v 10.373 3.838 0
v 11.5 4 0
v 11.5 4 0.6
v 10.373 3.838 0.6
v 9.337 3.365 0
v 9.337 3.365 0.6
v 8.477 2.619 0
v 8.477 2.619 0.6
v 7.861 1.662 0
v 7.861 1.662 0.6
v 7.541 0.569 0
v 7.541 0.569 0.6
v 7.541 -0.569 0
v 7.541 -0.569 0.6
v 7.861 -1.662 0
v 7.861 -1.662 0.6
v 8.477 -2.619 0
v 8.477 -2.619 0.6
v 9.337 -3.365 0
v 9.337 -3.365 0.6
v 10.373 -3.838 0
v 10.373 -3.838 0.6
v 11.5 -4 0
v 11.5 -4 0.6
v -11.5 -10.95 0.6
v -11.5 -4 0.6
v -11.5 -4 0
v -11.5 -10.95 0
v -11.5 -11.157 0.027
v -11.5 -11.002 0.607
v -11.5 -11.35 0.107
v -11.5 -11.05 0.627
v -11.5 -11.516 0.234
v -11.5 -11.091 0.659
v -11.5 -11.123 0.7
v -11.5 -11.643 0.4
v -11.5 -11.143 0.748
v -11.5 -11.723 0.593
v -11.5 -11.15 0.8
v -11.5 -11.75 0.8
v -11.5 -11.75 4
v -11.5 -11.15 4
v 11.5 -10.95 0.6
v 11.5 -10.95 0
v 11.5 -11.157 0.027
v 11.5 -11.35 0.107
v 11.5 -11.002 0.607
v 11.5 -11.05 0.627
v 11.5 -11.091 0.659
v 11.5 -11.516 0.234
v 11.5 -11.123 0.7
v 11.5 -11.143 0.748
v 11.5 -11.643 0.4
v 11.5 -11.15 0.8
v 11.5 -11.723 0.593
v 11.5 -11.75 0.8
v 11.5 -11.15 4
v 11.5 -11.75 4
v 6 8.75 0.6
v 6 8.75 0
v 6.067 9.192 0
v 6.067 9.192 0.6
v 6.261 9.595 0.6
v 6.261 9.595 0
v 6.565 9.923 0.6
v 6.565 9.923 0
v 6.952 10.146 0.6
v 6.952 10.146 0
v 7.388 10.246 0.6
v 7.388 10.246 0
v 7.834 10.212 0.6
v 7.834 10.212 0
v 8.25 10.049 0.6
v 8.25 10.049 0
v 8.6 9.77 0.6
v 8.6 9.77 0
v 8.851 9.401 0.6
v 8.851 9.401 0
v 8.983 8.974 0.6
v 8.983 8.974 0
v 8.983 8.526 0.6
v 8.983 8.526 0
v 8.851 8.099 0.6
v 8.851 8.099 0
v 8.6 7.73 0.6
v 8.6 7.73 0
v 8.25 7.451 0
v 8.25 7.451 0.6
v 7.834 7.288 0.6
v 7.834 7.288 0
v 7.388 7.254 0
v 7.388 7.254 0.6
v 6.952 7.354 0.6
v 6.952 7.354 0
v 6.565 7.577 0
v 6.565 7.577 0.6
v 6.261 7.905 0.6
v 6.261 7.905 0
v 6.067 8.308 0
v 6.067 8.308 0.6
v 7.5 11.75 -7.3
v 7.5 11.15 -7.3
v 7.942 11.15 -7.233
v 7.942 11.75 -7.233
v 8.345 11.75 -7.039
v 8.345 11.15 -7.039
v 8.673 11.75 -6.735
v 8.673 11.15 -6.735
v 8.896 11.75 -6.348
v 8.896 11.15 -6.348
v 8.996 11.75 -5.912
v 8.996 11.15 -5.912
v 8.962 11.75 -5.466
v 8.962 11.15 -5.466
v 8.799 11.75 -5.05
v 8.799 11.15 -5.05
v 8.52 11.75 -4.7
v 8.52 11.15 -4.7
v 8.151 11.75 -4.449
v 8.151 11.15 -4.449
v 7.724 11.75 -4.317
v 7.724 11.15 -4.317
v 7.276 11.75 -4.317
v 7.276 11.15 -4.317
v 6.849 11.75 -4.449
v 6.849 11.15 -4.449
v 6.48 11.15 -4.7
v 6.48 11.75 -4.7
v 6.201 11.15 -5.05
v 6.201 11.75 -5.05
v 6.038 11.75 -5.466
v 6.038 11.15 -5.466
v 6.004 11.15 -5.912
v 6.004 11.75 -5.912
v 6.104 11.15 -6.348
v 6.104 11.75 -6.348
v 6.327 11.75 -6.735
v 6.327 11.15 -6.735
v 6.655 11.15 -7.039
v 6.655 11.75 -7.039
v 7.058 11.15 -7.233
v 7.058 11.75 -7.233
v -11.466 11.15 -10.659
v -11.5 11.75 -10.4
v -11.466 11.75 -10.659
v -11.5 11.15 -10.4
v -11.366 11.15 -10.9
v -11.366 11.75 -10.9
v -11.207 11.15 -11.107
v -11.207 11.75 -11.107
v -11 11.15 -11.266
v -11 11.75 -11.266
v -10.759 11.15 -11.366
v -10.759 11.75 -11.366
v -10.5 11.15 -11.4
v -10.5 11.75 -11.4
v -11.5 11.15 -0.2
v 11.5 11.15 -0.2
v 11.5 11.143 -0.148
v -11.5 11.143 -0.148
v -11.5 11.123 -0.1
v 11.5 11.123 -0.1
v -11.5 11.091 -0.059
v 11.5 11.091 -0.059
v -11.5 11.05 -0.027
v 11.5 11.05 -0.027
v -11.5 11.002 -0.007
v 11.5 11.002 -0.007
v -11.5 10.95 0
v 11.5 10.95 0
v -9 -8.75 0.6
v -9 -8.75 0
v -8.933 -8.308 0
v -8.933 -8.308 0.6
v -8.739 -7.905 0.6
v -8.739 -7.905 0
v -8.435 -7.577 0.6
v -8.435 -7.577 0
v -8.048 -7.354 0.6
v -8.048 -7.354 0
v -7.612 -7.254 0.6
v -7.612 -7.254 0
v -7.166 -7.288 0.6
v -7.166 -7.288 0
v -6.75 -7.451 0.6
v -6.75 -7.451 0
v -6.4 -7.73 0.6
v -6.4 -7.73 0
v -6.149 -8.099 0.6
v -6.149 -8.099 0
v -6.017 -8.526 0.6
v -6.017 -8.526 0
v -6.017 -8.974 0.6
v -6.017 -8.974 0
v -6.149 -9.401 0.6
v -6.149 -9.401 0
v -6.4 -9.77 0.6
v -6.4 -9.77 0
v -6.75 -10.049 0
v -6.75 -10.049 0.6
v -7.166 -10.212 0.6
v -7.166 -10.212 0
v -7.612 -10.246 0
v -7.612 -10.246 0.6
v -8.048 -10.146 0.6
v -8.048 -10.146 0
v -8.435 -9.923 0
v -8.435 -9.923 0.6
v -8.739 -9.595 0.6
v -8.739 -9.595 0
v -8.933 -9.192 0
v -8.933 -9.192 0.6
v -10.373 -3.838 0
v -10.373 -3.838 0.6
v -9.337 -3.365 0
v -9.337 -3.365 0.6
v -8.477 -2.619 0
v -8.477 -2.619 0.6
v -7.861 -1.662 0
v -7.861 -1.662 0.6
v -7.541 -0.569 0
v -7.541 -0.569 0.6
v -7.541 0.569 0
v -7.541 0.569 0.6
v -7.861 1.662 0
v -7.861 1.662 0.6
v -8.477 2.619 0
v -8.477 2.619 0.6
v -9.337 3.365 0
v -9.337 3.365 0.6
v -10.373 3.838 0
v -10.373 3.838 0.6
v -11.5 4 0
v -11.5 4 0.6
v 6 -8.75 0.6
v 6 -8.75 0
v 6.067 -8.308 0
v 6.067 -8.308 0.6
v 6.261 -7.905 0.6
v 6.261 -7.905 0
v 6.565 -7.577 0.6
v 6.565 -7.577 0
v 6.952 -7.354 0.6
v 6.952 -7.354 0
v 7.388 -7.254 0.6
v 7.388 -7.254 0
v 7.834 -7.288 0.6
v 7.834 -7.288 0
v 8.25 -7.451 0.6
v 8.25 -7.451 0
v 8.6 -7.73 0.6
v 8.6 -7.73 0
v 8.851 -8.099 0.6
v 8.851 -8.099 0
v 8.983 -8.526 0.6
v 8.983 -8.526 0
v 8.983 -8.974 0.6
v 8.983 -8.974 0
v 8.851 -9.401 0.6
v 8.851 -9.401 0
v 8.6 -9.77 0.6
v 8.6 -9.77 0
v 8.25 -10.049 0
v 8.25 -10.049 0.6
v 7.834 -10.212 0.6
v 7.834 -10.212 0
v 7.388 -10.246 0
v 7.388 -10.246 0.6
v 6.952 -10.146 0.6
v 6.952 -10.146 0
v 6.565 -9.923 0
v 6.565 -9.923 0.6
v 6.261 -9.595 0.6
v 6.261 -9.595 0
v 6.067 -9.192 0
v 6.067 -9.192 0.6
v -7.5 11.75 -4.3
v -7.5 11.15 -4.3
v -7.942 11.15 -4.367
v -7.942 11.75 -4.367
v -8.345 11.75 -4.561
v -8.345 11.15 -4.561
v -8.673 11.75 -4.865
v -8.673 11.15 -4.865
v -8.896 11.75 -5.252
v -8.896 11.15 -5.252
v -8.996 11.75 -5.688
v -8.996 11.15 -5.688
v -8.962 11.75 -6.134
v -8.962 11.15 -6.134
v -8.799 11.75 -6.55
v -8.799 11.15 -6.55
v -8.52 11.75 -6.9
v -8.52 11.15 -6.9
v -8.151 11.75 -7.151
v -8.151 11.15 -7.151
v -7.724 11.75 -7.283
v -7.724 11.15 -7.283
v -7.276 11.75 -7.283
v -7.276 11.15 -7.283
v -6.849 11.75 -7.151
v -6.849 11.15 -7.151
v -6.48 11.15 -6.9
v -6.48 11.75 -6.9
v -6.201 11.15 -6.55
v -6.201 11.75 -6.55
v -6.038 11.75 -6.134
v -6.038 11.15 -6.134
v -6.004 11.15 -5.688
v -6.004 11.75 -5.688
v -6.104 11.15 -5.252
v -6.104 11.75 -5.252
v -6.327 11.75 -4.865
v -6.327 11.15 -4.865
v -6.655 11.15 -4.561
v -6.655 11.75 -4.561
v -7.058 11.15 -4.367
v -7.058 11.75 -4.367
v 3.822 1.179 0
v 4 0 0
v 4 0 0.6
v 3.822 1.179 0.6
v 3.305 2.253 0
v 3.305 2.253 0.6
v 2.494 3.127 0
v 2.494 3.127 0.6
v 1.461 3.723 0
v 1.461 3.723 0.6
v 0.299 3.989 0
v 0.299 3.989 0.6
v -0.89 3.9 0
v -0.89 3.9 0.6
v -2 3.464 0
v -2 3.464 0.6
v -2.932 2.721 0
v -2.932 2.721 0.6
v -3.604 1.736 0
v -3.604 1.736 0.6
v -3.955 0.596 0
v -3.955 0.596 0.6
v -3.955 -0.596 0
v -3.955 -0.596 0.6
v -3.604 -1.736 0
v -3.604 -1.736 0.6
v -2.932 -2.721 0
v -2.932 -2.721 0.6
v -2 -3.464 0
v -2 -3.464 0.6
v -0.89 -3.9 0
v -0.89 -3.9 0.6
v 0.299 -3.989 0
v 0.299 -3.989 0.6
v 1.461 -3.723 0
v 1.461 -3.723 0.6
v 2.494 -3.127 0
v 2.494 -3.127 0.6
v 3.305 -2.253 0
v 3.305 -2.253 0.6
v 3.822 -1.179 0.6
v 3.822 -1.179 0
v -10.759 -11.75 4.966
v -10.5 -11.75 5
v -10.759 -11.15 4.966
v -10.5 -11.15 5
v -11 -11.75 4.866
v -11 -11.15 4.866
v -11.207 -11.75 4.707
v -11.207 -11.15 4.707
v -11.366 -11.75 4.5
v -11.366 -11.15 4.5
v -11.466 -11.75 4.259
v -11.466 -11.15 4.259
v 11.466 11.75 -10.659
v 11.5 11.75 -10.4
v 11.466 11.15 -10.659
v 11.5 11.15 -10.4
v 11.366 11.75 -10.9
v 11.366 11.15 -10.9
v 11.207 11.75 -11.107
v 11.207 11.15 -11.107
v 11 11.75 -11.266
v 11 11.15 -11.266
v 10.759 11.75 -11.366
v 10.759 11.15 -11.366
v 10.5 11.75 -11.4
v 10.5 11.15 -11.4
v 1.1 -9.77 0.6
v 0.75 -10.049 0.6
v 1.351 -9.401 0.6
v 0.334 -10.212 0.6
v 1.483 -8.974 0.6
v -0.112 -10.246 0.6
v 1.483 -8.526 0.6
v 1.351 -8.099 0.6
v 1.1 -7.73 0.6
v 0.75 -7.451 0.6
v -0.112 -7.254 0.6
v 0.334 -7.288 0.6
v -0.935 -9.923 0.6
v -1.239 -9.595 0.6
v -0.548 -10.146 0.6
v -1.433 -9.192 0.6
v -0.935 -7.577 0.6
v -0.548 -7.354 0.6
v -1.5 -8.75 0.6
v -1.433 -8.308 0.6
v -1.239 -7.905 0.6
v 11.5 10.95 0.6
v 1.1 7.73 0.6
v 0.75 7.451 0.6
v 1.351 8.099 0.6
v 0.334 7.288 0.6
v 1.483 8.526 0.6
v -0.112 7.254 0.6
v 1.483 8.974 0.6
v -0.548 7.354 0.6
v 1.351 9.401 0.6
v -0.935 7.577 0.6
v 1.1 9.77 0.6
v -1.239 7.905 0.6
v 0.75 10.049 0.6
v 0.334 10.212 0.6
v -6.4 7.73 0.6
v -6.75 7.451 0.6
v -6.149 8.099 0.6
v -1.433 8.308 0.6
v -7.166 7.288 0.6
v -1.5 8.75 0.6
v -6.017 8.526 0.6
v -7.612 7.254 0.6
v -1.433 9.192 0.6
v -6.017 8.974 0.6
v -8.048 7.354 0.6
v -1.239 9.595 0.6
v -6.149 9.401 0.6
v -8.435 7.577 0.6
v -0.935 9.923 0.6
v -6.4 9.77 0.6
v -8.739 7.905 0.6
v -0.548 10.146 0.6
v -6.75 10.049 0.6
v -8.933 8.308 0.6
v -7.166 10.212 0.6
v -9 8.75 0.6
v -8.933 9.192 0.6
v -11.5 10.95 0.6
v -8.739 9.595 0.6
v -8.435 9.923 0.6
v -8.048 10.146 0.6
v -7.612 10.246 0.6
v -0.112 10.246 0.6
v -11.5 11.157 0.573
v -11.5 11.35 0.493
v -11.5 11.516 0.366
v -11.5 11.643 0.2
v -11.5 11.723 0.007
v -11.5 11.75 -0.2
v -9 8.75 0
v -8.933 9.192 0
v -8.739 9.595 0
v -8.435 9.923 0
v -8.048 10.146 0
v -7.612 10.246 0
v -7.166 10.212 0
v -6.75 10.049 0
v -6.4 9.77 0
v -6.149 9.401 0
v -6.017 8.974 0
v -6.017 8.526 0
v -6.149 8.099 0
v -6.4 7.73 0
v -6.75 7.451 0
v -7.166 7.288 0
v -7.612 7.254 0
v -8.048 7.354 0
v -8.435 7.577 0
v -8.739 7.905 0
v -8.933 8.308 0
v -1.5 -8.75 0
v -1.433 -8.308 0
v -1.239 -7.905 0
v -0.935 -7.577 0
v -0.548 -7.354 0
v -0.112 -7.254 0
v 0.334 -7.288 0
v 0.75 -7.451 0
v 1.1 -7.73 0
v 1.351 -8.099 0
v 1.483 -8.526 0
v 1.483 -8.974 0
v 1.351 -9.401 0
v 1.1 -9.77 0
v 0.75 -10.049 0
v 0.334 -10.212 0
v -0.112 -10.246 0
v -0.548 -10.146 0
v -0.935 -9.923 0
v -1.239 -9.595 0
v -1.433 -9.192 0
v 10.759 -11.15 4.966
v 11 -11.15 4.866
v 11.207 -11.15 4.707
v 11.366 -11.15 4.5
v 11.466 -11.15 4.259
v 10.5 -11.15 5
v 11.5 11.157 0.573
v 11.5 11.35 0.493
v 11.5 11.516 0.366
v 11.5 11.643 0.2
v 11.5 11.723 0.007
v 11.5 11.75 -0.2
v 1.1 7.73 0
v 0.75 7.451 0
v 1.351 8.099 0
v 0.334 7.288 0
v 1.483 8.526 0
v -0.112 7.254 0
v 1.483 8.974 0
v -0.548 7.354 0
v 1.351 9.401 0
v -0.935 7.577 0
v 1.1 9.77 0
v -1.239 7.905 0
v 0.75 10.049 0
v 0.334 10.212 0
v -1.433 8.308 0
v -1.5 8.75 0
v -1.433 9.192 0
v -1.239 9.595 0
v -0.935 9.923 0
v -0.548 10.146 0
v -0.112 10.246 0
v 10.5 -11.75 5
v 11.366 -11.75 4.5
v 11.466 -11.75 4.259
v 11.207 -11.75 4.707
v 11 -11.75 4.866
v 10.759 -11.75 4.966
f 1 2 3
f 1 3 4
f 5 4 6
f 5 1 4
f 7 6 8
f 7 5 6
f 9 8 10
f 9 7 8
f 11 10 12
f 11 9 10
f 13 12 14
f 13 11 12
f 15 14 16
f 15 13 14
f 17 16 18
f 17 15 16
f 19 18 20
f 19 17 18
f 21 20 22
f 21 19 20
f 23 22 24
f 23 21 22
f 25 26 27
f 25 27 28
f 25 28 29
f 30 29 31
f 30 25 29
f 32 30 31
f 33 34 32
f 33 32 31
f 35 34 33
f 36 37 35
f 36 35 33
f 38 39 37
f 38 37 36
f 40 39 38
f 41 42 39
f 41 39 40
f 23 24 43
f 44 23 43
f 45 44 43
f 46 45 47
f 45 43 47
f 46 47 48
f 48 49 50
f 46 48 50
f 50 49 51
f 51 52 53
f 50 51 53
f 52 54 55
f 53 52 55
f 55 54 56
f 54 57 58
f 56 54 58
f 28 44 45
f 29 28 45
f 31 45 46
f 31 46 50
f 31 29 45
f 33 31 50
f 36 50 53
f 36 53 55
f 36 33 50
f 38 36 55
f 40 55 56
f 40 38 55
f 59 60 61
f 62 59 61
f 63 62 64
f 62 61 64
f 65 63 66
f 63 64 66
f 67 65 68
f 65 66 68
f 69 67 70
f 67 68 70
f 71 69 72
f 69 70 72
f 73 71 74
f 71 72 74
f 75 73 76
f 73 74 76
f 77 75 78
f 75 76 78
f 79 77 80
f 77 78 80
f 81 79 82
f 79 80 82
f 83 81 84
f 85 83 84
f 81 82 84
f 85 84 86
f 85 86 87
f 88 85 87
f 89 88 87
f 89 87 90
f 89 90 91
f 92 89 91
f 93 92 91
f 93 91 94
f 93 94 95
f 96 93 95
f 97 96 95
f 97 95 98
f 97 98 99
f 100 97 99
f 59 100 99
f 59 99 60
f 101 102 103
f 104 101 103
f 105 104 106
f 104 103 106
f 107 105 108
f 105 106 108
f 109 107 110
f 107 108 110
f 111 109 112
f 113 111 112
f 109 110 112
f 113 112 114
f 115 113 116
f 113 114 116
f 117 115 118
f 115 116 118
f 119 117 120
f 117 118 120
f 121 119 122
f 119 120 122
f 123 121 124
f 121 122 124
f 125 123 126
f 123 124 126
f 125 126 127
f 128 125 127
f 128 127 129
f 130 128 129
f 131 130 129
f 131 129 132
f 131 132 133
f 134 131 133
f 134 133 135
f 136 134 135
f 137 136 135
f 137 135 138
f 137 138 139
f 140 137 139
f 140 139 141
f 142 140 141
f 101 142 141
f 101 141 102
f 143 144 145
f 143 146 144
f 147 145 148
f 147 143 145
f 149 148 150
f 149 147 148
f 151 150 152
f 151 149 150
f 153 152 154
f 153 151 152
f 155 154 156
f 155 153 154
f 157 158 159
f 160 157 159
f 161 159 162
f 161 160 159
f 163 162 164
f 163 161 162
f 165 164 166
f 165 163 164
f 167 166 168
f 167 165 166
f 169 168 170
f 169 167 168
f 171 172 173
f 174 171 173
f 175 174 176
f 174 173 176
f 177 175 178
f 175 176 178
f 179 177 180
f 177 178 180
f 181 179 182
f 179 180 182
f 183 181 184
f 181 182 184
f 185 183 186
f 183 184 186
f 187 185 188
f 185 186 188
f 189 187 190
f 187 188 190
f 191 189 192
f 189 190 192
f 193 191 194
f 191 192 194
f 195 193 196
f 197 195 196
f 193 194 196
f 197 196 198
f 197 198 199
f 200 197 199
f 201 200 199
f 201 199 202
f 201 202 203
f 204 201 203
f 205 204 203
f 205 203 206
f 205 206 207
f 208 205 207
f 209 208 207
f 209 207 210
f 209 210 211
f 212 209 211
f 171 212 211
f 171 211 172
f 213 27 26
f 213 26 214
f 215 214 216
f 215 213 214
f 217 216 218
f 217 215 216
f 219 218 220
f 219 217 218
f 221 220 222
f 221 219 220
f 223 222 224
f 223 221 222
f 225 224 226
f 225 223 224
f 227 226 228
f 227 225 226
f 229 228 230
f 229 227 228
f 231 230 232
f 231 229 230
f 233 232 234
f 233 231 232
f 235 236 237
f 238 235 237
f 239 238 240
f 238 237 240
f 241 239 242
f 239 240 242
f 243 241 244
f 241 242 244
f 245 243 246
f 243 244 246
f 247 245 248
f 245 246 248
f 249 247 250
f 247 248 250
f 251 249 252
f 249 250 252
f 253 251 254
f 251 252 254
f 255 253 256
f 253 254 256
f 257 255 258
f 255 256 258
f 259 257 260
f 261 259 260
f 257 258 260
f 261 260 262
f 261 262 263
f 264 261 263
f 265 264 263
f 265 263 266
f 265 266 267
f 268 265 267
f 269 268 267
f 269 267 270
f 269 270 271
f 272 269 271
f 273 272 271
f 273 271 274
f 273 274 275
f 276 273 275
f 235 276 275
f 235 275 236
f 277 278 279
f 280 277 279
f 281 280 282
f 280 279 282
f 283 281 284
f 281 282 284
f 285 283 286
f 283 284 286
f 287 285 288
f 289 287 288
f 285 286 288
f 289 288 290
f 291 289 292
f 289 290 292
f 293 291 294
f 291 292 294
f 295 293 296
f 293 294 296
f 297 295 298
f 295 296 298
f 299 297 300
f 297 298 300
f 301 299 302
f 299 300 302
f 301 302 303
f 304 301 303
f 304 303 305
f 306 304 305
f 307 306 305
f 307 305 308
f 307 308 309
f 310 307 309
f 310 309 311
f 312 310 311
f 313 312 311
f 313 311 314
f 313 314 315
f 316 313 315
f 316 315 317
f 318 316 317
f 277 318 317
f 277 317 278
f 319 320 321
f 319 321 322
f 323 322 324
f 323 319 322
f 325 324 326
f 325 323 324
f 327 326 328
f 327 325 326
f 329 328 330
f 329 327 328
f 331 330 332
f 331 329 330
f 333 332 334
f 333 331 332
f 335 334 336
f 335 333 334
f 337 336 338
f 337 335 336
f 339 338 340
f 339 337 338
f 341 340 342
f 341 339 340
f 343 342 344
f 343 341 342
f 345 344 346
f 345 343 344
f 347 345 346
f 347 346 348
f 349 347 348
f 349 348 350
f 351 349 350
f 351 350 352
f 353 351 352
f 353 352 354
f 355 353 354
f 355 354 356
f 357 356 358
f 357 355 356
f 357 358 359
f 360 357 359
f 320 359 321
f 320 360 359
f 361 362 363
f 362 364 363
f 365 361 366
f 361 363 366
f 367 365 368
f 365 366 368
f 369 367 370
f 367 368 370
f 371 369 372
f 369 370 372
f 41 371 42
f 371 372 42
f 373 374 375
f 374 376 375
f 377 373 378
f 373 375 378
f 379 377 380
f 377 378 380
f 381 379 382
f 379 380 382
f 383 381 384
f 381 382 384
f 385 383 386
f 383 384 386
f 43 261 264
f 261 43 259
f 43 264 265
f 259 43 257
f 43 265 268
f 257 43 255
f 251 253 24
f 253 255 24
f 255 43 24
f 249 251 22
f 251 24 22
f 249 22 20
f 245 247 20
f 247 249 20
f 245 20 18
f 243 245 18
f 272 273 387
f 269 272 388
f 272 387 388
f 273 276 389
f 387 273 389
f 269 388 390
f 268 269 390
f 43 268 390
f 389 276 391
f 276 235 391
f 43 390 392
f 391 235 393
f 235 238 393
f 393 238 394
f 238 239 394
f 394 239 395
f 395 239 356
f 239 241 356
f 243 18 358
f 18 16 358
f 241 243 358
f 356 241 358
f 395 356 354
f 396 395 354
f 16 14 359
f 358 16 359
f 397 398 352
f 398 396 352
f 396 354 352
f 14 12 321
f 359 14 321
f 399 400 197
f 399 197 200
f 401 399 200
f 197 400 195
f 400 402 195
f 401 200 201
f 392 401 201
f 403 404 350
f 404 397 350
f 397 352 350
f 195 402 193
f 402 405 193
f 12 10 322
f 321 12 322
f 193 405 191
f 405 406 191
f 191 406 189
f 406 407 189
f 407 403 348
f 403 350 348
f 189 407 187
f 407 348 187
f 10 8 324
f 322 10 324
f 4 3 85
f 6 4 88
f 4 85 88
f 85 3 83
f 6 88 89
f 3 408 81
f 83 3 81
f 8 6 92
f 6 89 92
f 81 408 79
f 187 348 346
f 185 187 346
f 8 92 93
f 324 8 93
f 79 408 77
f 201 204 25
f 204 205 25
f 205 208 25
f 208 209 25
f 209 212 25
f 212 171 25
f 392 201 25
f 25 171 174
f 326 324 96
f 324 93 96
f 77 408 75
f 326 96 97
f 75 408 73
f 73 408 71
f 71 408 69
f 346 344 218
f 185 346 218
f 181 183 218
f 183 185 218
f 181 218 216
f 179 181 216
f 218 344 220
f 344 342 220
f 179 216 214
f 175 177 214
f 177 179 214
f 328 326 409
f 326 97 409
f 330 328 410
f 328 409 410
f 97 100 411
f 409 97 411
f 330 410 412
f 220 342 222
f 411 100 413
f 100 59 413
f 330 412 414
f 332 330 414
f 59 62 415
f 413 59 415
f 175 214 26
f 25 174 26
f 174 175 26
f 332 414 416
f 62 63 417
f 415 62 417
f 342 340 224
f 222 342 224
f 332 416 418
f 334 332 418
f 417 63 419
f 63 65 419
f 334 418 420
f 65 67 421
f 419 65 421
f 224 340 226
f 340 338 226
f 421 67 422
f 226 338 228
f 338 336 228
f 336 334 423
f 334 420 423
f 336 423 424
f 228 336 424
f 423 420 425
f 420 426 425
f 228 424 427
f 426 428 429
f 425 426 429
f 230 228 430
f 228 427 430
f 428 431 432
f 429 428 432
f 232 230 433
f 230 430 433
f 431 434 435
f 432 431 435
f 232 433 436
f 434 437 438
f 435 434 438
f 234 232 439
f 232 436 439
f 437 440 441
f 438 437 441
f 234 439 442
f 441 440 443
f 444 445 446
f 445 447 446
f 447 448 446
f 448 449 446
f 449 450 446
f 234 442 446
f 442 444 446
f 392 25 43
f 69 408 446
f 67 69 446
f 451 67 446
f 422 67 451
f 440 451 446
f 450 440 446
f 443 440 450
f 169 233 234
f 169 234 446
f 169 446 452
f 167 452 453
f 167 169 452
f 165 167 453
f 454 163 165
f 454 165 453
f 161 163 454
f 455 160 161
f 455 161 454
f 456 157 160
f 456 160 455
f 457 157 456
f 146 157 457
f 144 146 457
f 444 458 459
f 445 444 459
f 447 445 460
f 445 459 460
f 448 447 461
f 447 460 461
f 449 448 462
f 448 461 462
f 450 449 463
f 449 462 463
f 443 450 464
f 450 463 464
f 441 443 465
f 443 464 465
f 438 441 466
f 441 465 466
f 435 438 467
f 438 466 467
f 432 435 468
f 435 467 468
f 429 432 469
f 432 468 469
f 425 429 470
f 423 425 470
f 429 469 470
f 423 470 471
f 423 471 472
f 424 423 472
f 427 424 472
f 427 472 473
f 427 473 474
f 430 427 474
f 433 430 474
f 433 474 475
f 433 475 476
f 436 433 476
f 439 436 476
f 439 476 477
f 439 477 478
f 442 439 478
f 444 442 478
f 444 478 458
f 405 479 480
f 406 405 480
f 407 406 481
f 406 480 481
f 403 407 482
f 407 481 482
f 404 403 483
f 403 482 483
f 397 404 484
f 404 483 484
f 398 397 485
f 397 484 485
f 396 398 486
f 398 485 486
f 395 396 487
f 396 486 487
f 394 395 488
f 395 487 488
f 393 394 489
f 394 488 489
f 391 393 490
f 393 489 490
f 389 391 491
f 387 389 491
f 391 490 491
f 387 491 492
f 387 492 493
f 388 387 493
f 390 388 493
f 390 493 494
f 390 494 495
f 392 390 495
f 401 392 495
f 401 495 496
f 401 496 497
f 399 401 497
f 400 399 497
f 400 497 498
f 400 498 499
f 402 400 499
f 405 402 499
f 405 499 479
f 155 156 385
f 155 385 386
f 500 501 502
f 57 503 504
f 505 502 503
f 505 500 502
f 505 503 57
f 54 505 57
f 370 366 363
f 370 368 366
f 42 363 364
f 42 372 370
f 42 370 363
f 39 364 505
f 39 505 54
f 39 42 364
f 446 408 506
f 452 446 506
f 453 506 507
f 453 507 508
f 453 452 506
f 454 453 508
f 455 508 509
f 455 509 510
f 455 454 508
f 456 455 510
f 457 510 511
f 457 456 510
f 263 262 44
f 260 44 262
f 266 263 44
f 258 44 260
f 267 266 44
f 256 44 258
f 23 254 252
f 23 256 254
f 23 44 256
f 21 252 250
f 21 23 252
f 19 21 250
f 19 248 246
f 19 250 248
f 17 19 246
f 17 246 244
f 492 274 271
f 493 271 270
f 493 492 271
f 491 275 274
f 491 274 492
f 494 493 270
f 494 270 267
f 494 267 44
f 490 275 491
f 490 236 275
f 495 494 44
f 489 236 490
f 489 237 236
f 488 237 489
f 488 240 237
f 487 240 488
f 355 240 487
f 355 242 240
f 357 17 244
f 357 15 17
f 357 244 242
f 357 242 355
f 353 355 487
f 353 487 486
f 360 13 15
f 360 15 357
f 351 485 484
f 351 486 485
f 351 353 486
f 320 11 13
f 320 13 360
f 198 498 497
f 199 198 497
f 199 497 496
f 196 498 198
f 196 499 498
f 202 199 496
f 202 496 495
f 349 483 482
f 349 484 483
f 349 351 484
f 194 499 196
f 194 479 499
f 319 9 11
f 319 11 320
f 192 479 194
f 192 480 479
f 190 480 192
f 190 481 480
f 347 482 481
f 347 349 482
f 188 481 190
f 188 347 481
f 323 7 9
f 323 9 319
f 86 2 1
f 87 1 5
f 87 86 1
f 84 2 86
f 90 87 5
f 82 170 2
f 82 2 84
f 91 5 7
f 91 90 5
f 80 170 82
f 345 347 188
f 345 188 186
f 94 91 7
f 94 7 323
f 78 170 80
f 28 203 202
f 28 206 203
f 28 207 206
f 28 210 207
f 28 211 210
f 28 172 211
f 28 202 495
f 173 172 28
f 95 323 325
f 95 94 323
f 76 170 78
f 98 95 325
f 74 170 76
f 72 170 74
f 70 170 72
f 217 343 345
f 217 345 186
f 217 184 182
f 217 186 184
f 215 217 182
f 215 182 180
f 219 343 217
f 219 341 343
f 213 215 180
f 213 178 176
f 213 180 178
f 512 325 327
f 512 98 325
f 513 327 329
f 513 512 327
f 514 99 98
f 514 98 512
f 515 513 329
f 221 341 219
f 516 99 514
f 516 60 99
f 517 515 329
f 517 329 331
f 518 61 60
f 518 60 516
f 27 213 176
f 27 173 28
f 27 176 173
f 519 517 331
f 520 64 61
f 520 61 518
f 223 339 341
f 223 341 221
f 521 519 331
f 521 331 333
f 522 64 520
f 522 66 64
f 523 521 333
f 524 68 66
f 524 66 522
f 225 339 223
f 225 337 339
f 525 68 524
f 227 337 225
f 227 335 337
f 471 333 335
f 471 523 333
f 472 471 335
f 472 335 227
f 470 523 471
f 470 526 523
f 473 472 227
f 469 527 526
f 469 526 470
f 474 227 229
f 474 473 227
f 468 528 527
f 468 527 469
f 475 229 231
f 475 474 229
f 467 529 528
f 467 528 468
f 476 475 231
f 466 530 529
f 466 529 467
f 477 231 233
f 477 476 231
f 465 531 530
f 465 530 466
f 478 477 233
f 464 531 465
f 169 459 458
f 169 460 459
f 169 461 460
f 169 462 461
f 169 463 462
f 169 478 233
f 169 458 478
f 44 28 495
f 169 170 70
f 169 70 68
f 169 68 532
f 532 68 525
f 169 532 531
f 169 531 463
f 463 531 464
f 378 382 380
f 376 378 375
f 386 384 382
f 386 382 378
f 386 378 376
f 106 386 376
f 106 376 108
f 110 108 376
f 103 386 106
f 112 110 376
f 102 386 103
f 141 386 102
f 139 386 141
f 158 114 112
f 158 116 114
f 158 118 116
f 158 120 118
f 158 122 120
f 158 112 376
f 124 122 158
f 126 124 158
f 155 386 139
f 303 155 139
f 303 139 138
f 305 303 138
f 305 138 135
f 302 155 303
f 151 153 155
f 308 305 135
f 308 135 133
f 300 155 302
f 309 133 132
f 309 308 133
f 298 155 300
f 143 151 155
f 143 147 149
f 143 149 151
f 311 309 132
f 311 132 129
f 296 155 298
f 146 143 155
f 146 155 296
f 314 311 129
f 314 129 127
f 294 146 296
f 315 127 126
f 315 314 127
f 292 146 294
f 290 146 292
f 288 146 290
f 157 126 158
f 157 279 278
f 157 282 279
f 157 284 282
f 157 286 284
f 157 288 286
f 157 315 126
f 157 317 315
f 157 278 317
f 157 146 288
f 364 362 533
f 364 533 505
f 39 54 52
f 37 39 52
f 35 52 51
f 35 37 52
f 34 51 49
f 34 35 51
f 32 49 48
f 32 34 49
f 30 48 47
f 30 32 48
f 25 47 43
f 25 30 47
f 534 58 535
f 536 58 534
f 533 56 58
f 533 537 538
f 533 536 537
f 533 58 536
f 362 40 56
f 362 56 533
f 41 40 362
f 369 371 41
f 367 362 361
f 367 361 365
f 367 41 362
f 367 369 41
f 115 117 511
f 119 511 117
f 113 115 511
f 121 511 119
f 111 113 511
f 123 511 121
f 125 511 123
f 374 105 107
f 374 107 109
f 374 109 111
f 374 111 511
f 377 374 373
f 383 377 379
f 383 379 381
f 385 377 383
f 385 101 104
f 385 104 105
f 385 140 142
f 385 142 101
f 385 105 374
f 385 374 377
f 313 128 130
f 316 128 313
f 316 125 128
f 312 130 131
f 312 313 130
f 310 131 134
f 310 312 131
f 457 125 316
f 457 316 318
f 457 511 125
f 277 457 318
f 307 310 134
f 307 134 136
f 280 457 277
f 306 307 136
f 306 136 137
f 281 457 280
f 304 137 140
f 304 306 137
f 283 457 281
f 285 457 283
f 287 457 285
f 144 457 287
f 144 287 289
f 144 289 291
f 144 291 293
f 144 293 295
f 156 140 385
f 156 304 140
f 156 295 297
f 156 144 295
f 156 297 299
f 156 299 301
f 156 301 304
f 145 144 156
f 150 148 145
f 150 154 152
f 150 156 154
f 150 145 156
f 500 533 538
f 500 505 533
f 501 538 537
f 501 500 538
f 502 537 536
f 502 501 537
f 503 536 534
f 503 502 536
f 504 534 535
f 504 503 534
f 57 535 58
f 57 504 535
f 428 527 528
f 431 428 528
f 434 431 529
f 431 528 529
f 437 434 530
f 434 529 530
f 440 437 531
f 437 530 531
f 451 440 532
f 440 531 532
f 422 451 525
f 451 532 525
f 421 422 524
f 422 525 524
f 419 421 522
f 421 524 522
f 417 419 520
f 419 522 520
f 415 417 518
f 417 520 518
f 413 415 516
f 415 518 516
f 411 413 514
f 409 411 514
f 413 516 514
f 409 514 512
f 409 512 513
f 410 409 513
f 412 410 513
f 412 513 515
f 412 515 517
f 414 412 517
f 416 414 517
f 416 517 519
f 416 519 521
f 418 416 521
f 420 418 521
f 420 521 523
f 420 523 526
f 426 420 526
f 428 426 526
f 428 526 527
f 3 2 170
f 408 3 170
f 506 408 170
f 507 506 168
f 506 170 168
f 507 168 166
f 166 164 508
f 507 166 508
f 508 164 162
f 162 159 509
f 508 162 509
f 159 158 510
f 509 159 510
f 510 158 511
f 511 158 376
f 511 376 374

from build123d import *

# Parameters (mm, degrees)
SKETCH1_R                    = 4
BOSS_EXTRUDE1_DEPTH          = 0.6
EDGE_FLANGE1_STRIP_W         = 2.8
EDGE_FLANGE1_STRIP_H         = 0.6
EDGE_FLANGE1_STRIP_CUT_DEPTH = 23
EDGE_FLANGE1_DEPTH           = 23
SKETCH14_R                   = 1.5
CUT_EXTRUDE3_DEPTH           = 21.00681134
EDGE_FLANGE2_STRIP_W         = 2.8
EDGE_FLANGE2_STRIP_H         = 0.6
EDGE_FLANGE2_STRIP_CUT_DEPTH = 23
EDGE_FLANGE2_DEPTH           = 23
SKETCH13_R                   = 1.5
CUT_EXTRUDE1_DEPTH           = 29.046746692
FILLET2_R                    = 1


# Sheet-metal steps are written as plain solids
with BuildPart() as part:
    # Sketch1 → Boss-Extrude1 (new body)
    with BuildSketch(Plane.XY):
        with BuildLine():
            Line((11.5, -4), (11.5, -11.75))
            Line((11.5, -11.75), (-11.5, -11.75))
            Line((-11.5, -11.75), (-11.5, -4))
            ThreePointArc((-11.5, -4), (-7.5, 0), (-11.5, 4))
            Line((-11.5, 4), (-11.5, 11.75))
            Line((-11.5, 11.75), (11.5, 11.75))
            Line((11.5, 11.75), (11.5, 4))
            ThreePointArc((11.5, 4), (7.5, 0), (11.5, -4))
        make_face()
        Circle(SKETCH1_R, mode=Mode.SUBTRACT)
    extrude(amount=BOSS_EXTRUDE1_DEPTH)

    # Edge-Flange1 strip (across the edge) → Edge-Flange1 strip cut (cut)
    with BuildSketch(Plane(origin=(-11.5, 11.75, 0), x_dir=(0, -1, 0), z_dir=(1, 0, 0))):
        with Locations((-0.6, -0.3)):
            Rectangle(EDGE_FLANGE1_STRIP_W, EDGE_FLANGE1_STRIP_H)
    extrude(amount=EDGE_FLANGE1_STRIP_CUT_DEPTH, mode=Mode.SUBTRACT)

    # Edge-Flange1 section (across the edge) → Edge-Flange1 (add)
    with BuildSketch(Plane(origin=(-11.5, 11.75, 0), x_dir=(0, -1, 0), z_dir=(1, 0, 0))):
        with BuildLine():
            Line((0, 0.2), (0, 11.4))
            Line((0, 11.4), (0.6, 11.4))
            Line((0.6, 11.4), (0.6, 0.2))
            ThreePointArc((0.6, 0.2), (0.658578644, 0.058578644), (0.8, 0))
            Line((0.8, 0), (0.8, -0.6))
            ThreePointArc((0.8, -0.6), (0.234314575, -0.365685425), (0, 0.2))
        make_face()
    extrude(amount=EDGE_FLANGE1_DEPTH)

    # Sketch14 → Cut-Extrude3 (cut, through all)
    with BuildSketch(Plane(origin=(0, 0, 0), x_dir=(-1, 0, 0), z_dir=(0, 0, -1))):
        with Locations((-7.5, -8.75)):
            Circle(SKETCH14_R)
        with Locations((0, -8.75)):
            Circle(SKETCH14_R)
        with Locations((7.5, -8.75)):
            Circle(SKETCH14_R)
        with Locations((7.5, 8.75)):
            Circle(SKETCH14_R)
        with Locations((0, 8.75)):
            Circle(SKETCH14_R)
        with Locations((-7.5, 8.75)):
            Circle(SKETCH14_R)
    extrude(amount=-CUT_EXTRUDE3_DEPTH, mode=Mode.SUBTRACT)

    # Edge-Flange2 strip (across the edge) → Edge-Flange2 strip cut (cut)
    with BuildSketch(Plane(origin=(-11.5, -11.75, 0.6), x_dir=(0, 1, 0), z_dir=(1, 0, 0))):
        with Locations((-0.6, -0.3)):
            Rectangle(EDGE_FLANGE2_STRIP_W, EDGE_FLANGE2_STRIP_H)
    extrude(amount=EDGE_FLANGE2_STRIP_CUT_DEPTH, mode=Mode.SUBTRACT)

    # Edge-Flange2 section (across the edge) → Edge-Flange2 (add)
    with BuildSketch(Plane(origin=(-11.5, -11.75, 0.6), x_dir=(0, 1, 0), z_dir=(1, 0, 0))):
        with BuildLine():
            Line((0, 0.2), (0, 4.4))
            Line((0, 4.4), (0.6, 4.4))
            Line((0.6, 4.4), (0.6, 0.2))
            ThreePointArc((0.6, 0.2), (0.658578644, 0.058578644), (0.8, 0))
            Line((0.8, 0), (0.8, -0.6))
            ThreePointArc((0.8, -0.6), (0.234314575, -0.365685425), (0, 0.2))
        make_face()
    extrude(amount=EDGE_FLANGE2_DEPTH)

    # Sketch13 → Cut-Extrude1 (cut, through all)
    with BuildSketch(Plane.XZ.offset(-11.15)):
        with Locations(Location((7.5, -5.8, 0), (0, 0, 270))):
            Circle(SKETCH13_R)
        with Locations(Location((-7.5, -5.8, 0), (0, 0, 90))):
            Circle(SKETCH13_R)
    extrude(amount=-CUT_EXTRUDE1_DEPTH, mode=Mode.SUBTRACT)

    # Fillet2
    fillet2_edges = [part.edges().sort_by_distance(p)[0] for p in [
        (-11.5, -11.45, 5),
        (11.5, -11.45, 5),
        (-11.5, 11.45, -11.4),
        (11.5, 11.45, -11.4),
    ]]
    fillet(fillet2_edges, radius=FILLET2_R)


solid = part.part
